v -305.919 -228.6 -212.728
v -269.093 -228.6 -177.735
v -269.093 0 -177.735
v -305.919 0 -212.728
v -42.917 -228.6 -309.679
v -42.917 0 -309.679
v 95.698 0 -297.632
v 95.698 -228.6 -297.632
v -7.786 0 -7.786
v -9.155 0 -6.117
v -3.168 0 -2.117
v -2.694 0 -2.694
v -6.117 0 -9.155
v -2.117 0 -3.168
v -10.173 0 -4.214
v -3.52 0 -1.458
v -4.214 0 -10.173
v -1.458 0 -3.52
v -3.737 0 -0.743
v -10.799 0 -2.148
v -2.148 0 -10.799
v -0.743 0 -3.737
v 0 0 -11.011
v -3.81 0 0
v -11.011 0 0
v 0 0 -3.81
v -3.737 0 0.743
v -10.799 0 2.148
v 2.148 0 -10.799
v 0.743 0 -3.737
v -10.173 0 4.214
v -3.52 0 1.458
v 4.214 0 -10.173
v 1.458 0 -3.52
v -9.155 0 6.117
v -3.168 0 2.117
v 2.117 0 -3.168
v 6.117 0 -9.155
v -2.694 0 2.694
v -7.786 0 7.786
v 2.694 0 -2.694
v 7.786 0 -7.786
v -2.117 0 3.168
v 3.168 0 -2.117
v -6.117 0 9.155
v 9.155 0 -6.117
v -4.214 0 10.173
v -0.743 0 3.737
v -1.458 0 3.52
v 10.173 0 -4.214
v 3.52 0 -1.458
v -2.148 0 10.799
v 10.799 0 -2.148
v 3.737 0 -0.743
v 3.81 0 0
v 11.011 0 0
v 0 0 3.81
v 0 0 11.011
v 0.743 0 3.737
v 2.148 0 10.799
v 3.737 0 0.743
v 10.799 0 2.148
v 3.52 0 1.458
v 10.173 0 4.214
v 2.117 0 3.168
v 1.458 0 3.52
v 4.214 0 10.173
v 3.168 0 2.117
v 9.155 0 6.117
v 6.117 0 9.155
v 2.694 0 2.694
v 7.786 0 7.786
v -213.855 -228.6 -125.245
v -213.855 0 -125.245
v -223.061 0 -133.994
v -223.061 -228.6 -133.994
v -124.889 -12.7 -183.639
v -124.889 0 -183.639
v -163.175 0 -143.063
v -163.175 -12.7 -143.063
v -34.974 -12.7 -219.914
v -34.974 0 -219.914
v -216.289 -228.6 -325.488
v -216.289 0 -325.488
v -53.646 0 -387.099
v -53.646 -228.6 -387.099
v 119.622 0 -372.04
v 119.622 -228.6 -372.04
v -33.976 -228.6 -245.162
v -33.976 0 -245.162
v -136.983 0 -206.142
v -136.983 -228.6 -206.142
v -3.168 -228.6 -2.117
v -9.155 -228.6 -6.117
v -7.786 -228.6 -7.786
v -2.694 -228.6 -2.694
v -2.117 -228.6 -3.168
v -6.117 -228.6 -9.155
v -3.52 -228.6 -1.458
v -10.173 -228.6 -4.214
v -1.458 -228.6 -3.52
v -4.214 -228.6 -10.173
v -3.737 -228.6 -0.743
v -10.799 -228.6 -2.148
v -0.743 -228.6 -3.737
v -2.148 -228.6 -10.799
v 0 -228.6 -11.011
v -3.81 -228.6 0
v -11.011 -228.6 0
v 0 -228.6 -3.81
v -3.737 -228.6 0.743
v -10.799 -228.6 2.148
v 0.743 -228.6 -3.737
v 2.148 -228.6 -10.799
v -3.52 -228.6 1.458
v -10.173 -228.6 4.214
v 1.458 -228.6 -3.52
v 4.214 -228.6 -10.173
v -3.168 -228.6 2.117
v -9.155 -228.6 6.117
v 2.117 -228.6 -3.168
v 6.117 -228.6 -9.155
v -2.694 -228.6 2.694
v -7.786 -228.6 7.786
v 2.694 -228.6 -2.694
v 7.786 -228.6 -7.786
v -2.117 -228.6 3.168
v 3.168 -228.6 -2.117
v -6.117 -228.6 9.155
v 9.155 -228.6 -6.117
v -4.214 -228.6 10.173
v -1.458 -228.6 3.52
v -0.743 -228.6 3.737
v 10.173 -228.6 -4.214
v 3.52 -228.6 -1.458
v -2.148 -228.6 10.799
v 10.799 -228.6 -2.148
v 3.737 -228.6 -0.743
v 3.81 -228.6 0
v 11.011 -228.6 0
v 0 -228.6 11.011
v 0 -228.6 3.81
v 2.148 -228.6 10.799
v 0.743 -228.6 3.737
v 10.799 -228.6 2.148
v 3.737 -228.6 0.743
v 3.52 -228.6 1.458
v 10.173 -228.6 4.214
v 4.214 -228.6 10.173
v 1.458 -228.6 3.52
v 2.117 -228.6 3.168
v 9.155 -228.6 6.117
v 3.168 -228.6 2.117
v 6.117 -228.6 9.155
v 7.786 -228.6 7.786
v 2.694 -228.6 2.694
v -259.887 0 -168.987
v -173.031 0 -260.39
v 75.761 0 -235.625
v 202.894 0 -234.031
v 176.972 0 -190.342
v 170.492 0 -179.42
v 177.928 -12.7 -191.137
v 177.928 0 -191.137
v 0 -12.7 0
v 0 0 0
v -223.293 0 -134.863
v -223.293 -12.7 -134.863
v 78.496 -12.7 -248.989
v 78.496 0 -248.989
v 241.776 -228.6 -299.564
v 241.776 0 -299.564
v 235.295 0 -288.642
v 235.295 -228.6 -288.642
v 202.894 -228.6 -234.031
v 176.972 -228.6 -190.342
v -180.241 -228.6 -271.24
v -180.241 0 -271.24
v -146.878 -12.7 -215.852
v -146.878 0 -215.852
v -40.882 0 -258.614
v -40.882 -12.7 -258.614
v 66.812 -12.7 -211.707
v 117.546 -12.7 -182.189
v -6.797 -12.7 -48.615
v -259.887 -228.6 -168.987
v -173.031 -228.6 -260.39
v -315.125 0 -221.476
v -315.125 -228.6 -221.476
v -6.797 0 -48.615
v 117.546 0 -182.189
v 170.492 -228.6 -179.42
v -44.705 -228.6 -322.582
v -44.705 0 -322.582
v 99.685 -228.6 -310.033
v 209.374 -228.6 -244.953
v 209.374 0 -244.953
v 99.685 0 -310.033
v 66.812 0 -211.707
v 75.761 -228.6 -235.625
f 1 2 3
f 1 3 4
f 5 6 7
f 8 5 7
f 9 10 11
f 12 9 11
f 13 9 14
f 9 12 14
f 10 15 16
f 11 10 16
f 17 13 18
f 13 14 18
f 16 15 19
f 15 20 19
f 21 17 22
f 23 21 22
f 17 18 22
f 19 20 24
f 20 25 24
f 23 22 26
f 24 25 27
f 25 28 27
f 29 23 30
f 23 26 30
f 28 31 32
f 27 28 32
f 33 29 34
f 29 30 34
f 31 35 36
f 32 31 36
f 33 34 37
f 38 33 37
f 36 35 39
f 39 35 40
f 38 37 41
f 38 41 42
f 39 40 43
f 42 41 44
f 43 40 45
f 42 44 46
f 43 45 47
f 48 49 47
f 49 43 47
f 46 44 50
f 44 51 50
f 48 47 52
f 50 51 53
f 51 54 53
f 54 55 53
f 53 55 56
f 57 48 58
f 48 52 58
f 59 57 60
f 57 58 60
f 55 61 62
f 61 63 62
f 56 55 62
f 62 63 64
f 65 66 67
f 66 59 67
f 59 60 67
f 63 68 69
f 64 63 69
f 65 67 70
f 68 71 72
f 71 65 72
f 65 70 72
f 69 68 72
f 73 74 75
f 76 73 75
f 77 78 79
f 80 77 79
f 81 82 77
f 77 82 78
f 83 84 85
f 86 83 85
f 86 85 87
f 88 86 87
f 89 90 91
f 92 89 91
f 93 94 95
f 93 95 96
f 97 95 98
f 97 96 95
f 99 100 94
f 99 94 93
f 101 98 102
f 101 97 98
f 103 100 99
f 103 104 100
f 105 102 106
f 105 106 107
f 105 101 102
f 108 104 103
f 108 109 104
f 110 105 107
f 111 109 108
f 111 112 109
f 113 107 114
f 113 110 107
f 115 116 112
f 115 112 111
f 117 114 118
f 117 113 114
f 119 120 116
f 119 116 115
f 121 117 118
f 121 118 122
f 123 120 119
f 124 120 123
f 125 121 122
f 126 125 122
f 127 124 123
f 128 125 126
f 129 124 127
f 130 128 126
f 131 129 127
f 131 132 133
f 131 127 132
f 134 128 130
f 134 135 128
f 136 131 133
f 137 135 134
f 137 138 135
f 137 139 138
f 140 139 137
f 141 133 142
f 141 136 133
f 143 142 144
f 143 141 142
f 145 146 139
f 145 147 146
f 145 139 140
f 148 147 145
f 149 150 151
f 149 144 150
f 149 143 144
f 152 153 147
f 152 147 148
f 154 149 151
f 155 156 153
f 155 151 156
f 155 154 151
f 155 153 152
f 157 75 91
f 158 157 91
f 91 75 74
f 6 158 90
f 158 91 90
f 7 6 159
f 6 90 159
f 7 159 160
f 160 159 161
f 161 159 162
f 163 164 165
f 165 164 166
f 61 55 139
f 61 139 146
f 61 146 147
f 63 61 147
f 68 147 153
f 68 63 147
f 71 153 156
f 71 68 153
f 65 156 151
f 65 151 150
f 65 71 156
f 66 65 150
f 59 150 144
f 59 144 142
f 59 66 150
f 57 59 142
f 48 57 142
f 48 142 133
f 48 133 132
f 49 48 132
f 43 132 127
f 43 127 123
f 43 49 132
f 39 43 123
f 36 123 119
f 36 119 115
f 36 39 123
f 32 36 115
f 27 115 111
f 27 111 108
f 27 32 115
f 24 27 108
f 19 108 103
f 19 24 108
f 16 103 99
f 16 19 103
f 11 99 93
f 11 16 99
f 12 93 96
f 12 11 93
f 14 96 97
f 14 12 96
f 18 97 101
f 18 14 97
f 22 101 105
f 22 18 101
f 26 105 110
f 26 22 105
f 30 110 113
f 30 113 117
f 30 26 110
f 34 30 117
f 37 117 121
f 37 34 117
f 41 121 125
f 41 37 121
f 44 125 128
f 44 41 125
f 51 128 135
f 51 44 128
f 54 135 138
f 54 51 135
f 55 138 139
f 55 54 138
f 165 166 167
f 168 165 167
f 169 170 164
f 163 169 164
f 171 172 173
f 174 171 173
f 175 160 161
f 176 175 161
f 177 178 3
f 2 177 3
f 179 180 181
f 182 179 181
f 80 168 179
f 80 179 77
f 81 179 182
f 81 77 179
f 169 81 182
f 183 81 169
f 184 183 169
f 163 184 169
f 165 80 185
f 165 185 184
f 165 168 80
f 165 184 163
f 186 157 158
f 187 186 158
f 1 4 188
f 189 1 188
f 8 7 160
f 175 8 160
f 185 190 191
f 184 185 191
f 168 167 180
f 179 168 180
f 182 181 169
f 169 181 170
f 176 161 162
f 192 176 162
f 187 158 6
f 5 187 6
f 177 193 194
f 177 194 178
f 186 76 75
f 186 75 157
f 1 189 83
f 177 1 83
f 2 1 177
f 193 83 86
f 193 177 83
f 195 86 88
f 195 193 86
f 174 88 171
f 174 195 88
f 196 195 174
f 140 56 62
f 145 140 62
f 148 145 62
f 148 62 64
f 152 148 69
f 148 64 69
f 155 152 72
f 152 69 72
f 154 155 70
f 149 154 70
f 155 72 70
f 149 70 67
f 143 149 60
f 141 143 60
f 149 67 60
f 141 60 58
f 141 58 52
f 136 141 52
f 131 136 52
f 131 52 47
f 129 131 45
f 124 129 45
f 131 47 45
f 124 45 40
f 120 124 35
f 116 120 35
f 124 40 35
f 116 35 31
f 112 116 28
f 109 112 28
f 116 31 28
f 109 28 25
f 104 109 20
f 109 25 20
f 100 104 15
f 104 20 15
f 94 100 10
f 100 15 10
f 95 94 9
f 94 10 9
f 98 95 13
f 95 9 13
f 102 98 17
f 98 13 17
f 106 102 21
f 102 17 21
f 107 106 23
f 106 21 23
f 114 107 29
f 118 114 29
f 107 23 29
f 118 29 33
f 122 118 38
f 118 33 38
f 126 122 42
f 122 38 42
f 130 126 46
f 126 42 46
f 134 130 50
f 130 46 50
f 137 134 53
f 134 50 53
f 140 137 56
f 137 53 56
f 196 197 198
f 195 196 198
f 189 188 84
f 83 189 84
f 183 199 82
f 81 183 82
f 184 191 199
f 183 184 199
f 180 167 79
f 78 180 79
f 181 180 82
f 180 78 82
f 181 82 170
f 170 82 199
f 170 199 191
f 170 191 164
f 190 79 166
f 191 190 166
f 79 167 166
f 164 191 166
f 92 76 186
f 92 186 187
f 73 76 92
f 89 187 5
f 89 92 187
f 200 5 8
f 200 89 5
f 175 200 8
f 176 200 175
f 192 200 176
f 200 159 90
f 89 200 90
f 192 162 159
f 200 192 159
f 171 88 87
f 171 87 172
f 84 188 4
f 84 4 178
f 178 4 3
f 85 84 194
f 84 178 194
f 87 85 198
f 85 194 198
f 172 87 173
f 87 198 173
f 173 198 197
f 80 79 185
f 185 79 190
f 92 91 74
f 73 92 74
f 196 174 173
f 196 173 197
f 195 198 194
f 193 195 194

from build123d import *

# Parameters (mm, degrees)
F0_R     = 11.0109
F0_R_2   = 3.81
F2_DEPTH = 228.6
F3_DEPTH = 228.6
F5_DEPTH = 12.7


with BuildPart() as f2:
    # F0 (on Front) → F2 (new body)
    with BuildSketch(Plane.XZ):
        Circle(F0_R)
        Circle(F0_R_2, mode=Mode.SUBTRACT)
        Polygon((202.893787, -234.030817), (176.97243, -190.341879), (79.74821, -248.02659), (-35.764049, -258.065688), (-144.192801, -216.991711), (-223.061151, -133.993542), (-259.886671, -168.9867), (-173.031361, -260.390053), (-42.916859, -309.678825), (95.697852, -297.631908), align=None)
        Polygon((176.97243, -190.341879), (170.492091, -179.419645), (75.7608, -235.625261), (-33.975847, -245.162403), (-136.983161, -206.142125), (-213.854771, -125.245253), (-223.061151, -133.993542), (-144.192801, -216.991711), (-35.764049, -258.065688), (79.74821, -248.02659), align=None)
    extrude(amount=F2_DEPTH)


with BuildPart() as f3:
    # F1 (on Front) → F3 (new body)
    with BuildSketch(Plane.XZ):
        Polygon((-209.079561, -314.637981), (-180.241001, -271.239639), (-269.093051, -177.734989), (-305.918571, -212.728147), align=None)
        Polygon((-44.705062, -322.58211), (-180.241001, -271.239639), (-209.079561, -314.637981), (-51.857872, -374.195247), align=None)
        Polygon((99.685263, -310.033238), (-44.705062, -322.58211), (-51.857872, -374.195247), (115.634905, -359.638556), align=None)
        Polygon((-51.857872, -374.195247), (-209.079561, -314.637981), (-305.918571, -212.728147), (-315.124951, -221.476436), (-216.289201, -325.487566), (-53.646074, -387.098532), (119.622316, -372.039885), (241.775823, -299.564223), (235.295483, -288.641989), (115.634905, -359.638556), align=None)
        Polygon((209.374127, -244.953051), (99.685263, -310.033238), (115.634905, -359.638556), (235.295483, -288.641989), align=None)
    extrude(amount=F3_DEPTH)


with BuildPart() as f5:
    # F4 (on Front) → F5 (new body)
    with BuildSketch(Plane.XZ):
        Polygon((177.928209, -191.137135), (0, 0), (-223.293483, -134.863019), (-146.877755, -215.852249), (-40.88226, -258.613564), (78.496183, -248.988504), align=None)
        Polygon((-6.797378, -48.61533), (117.54571, -182.189324), (66.812401, -211.70689), (-34.973862, -219.913555), (-124.889301, -183.639349), (-163.17452, -143.06275), align=None, mode=Mode.SUBTRACT)
    extrude(amount=F5_DEPTH)


solid = Compound([f2.part, f3.part, f5.part])
